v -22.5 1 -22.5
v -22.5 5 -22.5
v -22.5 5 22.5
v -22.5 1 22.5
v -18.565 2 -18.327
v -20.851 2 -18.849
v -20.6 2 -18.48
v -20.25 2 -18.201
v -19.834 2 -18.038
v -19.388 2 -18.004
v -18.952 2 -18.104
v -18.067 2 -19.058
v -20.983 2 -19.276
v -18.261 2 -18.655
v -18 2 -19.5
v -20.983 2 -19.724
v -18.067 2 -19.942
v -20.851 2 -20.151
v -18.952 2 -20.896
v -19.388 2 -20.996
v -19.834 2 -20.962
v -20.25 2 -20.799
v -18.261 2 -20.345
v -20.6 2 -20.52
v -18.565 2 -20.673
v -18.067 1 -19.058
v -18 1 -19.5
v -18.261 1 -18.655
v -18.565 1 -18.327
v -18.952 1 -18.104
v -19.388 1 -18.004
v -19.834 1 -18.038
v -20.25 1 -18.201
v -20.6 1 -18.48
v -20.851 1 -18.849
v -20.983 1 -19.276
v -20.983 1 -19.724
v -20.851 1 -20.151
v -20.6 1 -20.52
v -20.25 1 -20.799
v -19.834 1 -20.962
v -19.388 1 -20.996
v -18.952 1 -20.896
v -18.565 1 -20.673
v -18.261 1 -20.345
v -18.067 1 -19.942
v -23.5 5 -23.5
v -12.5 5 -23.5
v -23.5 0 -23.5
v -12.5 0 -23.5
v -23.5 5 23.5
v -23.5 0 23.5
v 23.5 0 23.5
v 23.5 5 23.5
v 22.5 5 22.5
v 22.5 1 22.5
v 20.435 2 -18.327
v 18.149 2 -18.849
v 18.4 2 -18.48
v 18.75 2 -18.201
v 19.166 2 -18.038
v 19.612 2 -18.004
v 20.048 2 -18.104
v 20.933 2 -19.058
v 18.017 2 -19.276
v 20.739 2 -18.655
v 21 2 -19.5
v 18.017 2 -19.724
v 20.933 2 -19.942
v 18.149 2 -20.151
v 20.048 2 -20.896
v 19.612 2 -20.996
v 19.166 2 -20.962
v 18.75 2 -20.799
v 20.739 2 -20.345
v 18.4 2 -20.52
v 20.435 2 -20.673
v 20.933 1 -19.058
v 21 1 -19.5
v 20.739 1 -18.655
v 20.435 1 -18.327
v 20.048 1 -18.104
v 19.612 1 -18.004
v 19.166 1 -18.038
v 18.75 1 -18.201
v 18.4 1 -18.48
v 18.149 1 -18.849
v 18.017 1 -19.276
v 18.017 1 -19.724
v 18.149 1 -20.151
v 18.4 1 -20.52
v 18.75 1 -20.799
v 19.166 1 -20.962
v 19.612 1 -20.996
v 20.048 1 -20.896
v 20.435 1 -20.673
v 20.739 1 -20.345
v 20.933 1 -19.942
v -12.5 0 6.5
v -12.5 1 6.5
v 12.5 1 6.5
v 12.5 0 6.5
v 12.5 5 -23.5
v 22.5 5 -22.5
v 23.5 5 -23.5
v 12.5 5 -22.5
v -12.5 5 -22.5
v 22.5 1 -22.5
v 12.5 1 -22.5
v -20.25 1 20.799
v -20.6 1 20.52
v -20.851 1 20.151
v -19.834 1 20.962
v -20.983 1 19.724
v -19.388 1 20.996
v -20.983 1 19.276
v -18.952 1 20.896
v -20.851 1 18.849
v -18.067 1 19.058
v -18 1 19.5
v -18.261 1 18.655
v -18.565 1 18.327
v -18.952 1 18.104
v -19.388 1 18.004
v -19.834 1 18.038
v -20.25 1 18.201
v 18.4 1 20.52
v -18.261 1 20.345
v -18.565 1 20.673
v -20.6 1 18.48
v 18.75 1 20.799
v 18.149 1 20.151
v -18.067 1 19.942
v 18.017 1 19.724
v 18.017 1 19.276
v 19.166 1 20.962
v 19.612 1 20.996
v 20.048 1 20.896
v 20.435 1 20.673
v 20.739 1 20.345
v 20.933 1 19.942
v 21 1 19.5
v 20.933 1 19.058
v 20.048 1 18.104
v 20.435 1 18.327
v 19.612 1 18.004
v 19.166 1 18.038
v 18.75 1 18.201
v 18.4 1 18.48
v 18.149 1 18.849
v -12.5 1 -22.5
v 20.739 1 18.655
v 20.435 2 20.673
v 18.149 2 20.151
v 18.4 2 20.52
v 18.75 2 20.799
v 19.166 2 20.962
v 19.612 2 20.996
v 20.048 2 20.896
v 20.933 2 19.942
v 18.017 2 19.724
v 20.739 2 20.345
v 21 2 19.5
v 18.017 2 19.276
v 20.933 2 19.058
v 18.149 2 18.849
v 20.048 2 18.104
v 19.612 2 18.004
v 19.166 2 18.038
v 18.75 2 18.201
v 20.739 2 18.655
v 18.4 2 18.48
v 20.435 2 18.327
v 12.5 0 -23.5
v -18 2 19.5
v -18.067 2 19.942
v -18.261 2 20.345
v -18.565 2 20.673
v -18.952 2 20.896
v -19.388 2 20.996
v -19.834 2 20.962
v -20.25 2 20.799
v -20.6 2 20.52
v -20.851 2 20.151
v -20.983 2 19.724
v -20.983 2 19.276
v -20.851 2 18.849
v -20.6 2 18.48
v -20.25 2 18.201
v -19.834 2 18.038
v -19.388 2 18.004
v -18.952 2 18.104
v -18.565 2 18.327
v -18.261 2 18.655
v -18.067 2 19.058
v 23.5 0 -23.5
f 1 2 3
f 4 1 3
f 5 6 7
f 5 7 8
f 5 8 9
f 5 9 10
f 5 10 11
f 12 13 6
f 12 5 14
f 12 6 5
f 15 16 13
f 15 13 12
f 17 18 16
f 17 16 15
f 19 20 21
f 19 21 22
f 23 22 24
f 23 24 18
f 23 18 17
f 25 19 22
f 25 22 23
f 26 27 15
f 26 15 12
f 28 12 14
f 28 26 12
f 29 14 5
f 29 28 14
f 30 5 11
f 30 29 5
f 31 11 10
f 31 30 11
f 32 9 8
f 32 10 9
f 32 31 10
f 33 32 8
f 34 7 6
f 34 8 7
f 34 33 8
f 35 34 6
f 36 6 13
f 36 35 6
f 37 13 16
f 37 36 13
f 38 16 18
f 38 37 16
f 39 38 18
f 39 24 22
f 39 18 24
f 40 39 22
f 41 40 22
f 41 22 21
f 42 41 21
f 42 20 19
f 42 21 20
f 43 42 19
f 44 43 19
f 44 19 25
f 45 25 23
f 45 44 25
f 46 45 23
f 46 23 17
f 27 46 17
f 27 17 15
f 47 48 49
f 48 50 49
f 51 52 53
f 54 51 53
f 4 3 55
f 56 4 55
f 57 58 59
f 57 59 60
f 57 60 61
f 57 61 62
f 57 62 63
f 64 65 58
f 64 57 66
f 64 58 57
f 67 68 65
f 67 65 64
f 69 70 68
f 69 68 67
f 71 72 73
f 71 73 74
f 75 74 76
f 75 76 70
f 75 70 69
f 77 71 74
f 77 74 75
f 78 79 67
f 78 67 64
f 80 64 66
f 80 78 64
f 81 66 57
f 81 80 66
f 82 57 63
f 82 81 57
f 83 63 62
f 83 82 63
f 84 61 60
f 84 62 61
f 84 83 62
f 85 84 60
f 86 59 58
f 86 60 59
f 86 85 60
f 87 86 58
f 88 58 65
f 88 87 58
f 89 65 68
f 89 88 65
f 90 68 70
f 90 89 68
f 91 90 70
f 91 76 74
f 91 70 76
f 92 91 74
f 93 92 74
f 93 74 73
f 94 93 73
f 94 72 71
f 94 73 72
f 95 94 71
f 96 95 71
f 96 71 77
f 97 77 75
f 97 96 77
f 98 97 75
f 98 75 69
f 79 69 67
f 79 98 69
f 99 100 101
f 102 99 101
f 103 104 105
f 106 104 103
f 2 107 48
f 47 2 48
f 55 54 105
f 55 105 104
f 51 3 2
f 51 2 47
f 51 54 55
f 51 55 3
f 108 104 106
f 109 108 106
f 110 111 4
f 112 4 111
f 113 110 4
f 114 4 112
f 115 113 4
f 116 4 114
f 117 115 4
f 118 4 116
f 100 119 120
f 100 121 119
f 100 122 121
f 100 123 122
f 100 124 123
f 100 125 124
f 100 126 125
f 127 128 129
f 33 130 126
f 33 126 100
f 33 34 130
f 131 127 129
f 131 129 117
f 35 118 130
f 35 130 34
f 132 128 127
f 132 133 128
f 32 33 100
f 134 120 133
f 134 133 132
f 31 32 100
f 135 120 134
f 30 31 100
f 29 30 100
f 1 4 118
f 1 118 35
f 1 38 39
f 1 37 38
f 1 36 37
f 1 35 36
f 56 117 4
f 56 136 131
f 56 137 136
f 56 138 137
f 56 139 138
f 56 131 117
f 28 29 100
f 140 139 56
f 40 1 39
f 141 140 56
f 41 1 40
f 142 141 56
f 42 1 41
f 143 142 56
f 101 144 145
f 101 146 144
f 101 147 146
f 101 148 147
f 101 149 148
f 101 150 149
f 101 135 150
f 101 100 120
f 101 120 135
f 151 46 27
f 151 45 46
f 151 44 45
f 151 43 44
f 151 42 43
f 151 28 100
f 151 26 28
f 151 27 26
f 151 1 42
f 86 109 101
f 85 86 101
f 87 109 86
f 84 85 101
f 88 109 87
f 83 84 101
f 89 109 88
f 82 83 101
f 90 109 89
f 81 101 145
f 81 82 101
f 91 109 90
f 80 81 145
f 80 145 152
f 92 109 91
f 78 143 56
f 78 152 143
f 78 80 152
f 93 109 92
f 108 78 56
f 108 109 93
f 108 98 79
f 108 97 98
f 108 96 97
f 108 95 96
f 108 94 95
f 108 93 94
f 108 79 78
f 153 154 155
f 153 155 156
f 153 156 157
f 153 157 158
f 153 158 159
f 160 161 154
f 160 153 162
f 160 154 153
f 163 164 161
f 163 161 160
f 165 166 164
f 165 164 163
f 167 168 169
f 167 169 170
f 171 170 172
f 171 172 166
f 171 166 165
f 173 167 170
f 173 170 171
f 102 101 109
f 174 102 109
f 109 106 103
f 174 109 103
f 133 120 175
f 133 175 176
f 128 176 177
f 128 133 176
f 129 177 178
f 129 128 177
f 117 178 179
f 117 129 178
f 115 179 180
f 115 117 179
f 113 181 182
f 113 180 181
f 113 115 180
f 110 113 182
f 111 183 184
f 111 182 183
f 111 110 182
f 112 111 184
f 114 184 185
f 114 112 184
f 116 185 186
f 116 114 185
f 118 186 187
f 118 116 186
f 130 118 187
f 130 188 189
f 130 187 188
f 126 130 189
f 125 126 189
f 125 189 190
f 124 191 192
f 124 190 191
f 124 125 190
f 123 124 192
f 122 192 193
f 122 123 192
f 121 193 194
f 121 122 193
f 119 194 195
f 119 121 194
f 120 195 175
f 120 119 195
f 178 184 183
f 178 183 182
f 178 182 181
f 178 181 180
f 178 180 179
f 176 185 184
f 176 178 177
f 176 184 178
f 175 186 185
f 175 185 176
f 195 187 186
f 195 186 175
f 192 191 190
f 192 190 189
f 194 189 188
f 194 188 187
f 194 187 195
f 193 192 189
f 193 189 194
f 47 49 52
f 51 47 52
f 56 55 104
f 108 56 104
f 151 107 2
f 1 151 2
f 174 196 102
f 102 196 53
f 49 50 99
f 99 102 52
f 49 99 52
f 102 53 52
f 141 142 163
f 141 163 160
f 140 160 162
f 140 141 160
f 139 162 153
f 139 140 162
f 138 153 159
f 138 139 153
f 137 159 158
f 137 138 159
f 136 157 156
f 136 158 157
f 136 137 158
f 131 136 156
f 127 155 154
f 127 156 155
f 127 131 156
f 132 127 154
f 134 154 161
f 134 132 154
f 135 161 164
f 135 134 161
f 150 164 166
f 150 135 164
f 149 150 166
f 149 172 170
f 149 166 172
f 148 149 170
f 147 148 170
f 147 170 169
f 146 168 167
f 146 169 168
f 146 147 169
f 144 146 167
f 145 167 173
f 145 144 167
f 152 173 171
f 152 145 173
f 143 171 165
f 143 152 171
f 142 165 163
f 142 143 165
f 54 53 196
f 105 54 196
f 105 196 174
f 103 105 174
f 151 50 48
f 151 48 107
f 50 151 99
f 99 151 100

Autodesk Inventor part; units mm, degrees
ref_plane "YZ Plane" through (0, 0, 0) normal (1, 0, 0) x (0, 1, 0)
ref_plane "XZ Plane" through (0, 0, 0) normal (0, 1, 0) x (-1, 0, 0)
ref_plane "XY Plane" through (0, 0, 0) normal (0, 0, 1) x (1, 0, 0)
sketch "Sketch1" plane through (0, 0, 0) normal (0, 1, 0) x (-1, 0, 0)
  point P0 (0, 0)
sketch "Sketch2" plane through (0, 0, 0) normal (0, 1, 0) x (-1, 0, 0)
  line L0 (23.5, 23.5) -> (-23.5, 23.5)
  line L1 (-23.5, 23.5) -> (-23.5, -23.5)
  line L2 (-23.5, -23.5) -> (23.5, -23.5)
  line L3 (23.5, -23.5) -> (23.5, 23.5)
  point P0 (0, 0)
  dimension "d4" = 47
  dimension "d5" = 47
  dimension "d6" = 23.5
  dimension "d7" = 23.5
extrude "Extrusion1" add sketch "Sketch2" along normal blind 5
sketch "Sketch3" plane through (0, 5, 0) normal (0, 1, 0) x (1, 0, 0)
  point P0 (0, 0)
sketch "Sketch4" plane through (0, 5, 0) normal (0, 1, 0) x (1, 0, 0)
  line L0 (-22.5, -22.5) -> (22.5, -22.5)
  line L1 (22.5, -22.5) -> (22.5, 22.5)
  line L2 (22.5, 22.5) -> (-22.5, 22.5)
  line L3 (-22.5, 22.5) -> (-22.5, -22.5)
  point P0 (0, 0)
  dimension "d10" = 45
  dimension "d11" = 45
  dimension "d12" = 22.5
  dimension "d13" = 22.5
extrude "Extrusion2" cut sketch "Sketch4" against normal blind 4
sketch "Sketch5" plane through (0, 5, 0) normal (0, 1, 0) x (1, 0, 0)
  line L0 (23.5, 23.5) -> (-23.5, 23.5) projected
  line L1 (12.5, 23.5) -> (-12.5, 23.5)
  line L2 (-12.5, 23.5) -> (-12.5, -6.5)
  line L3 (-12.5, -6.5) -> (12.5, -6.5)
  line L4 (12.5, -6.5) -> (12.5, 23.5)
  point P0 (0, 0)
  dimension "d16" = 30
  dimension "d17" = 25
  dimension "d18" = 12.5
extrude "Extrusion3" cut sketch "Sketch5" against normal blind 10
sketch "Sketch6" plane through (0, 1, 0) normal (0, 1, 0) x (1, 0, 0)
  circle A0 centre (-19.5, -19.5) radius 1.5
  line L0 (-23.5, 23.5) -> (-23.5, -23.5) projected
  line L1 (-23.5, -23.5) -> (23.5, -23.5) projected
  line L2 (0, 0) -> (-11.992, 0) construction
  line L3 (0, 0) -> (0, -9.7427) construction
  circle A1 centre (-19.5, 19.5) radius 1.5
  line L4 (-22.5, -22.5) -> (-22.5, 22.5) projected
  line L5 (22.5, -22.5) -> (-22.5, -22.5) projected
  circle A2 centre (19.5, -19.5) radius 1.5
  circle A3 centre (19.5, 19.5) radius 1.5
  dimension "d21" = 3
  dimension "d24" = 3
  dimension "d25" = 3
  dimension "d26" = 3
  dimension "d27" = 3
  dimension "d28" = 3
extrude "Extrusion4" add sketch "Sketch6" along normal blind 1
properties part number "particle_sensor_case_bottom"
